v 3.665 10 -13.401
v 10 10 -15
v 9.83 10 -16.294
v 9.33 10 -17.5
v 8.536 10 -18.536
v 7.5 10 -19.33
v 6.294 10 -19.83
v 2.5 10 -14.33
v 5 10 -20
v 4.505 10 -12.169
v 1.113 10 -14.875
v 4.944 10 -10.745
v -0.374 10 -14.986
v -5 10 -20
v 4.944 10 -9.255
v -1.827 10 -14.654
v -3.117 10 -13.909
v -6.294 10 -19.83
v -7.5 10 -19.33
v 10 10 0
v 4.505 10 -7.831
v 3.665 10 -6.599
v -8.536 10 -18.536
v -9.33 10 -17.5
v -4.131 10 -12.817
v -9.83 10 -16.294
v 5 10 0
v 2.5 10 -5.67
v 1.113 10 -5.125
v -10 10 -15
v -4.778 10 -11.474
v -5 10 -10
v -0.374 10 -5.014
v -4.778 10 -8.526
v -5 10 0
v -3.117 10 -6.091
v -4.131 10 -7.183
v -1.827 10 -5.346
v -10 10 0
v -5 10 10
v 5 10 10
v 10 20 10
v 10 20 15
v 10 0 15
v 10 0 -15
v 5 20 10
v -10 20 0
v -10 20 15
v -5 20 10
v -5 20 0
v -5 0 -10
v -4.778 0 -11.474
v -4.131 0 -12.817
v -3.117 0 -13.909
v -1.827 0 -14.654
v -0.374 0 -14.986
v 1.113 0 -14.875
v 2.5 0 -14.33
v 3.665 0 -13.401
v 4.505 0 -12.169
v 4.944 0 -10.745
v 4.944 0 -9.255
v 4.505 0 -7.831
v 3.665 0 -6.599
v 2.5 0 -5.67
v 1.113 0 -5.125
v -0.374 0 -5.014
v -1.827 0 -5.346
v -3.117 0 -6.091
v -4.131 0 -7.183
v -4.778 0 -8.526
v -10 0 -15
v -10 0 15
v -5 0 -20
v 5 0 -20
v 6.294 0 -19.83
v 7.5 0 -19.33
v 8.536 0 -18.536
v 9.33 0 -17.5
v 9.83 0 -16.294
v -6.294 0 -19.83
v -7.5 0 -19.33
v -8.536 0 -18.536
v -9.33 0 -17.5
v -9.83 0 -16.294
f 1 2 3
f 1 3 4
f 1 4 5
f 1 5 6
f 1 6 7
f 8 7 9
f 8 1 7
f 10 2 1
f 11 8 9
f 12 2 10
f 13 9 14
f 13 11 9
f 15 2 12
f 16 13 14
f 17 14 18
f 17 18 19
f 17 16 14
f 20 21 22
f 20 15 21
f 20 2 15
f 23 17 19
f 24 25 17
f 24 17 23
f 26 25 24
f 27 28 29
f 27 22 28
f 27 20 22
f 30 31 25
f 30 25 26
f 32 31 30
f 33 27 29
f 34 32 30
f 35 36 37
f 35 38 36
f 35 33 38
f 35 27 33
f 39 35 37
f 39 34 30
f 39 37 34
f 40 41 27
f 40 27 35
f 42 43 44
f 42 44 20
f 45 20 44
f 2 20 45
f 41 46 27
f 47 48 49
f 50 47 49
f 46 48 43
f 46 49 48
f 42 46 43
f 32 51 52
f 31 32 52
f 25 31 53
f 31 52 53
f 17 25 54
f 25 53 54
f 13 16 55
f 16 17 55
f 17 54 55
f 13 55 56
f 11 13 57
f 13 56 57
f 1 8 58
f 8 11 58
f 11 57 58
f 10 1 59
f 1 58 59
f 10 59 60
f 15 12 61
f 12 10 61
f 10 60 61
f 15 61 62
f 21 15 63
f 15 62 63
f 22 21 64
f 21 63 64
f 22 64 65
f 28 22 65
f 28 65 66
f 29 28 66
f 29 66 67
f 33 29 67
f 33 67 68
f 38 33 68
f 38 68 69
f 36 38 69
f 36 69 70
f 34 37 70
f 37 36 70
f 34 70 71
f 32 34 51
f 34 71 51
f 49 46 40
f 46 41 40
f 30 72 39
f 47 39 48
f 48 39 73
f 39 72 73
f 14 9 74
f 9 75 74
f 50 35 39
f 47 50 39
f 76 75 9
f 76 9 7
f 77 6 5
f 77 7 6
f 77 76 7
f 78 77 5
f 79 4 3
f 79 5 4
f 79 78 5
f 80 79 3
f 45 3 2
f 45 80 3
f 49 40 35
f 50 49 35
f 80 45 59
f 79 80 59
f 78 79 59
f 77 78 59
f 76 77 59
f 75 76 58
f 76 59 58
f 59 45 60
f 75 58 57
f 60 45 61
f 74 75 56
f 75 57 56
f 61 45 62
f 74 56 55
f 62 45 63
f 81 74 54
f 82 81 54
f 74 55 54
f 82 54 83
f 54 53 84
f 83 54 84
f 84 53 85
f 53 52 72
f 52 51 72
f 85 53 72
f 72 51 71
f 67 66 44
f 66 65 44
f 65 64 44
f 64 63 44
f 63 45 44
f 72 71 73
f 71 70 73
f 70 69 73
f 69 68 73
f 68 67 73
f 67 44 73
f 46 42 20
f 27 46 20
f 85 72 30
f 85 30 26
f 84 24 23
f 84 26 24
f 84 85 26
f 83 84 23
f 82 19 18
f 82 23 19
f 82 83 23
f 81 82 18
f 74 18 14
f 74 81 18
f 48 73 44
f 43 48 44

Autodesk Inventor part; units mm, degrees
ref_plane "YZ Plane" through (0, 0, 0) normal (1, 0, 0) x (0, 1, 0)
ref_plane "XZ Plane" through (0, 0, 0) normal (0, 1, 0) x (-1, 0, 0)
ref_plane "XY Plane" through (0, 0, 0) normal (0, 0, 1) x (1, 0, 0)
sketch "草圖1" plane through (0, 0, 0) normal (0, 1, 0) x (-1, 0, 0)
  line L0 (10, 15) -> (-10, 15)
  line L1 (-10, 15) -> (-10, -15)
  line L2 (-5, -20) -> (5, -20)
  line L3 (10, -15) -> (10, 15)
  arc A0 (5, -20) -> (10, -15) centre (5, -15) ccw
  arc A1 (-10, -15) -> (-5, -20) centre (-5, -15) ccw
  circle A2 centre (0, -10) radius 5
  point P0 (0, 0)
  point P1 (10, -20)
  point P2 (0, -20)
  point P3 (10, 0)
  dimension "d0" = 35
  dimension "d1" = 20
  dimension "d2" = 5
  dimension "d3" = 10
  dimension "d4" = 10
extrude "擠出1" add sketch "草圖1" along normal blind 10
sketch "草圖2" plane through (0, 10, 0) normal (0, 1, 0) x (1, 0, 0)
  circle A0 centre (0, 10) radius 5 construction
  line L0 (-10, -15) -> (10, -15) construction
  line L1 (10, -15) -> (10, 15) construction
  arc A1 (10, 15) -> (5, 20) centre (5, 15) ccw construction
  line L2 (5, 20) -> (-5, 20) construction
  arc A2 (-5, 20) -> (-10, 15) centre (-5, 15) ccw construction
  line L3 (-10, 15) -> (-10, -15) construction
  line L4 (10, -15) -> (10, 15) projected
  line L5 (-10, -15) -> (10, -15)
  line L6 (10, -15) -> (10, -10)
  line L7 (10, -10) -> (-5, -10)
  line L8 (-10, -10.0359) -> (-10, -15)
  line L9 (-10, -15) -> (10, -15) projected
  line L10 (-10, -15) -> (-6.3427, -15)
  line L11 (-5, -10) -> (-5, 0)
  line L12 (-5, 0) -> (-10, 0)
  line L13 (-10, 0) -> (-10, -15)
  point P0 (0, 0)
  dimension "d7" = 5
  dimension "d8" = 5
  dimension "d9" = 15
extrude "擠出2" add sketch "草圖2" along normal blind 10
sketch "草圖3" plane through (10, 0, 15) normal (1, 0, 0) x (0, 0, -1)
  line L0 (15, 10) -> (5, 10) construction
  line L1 (15, 10) -> (15, 20) construction
  line L2 (5, 20) -> (15, 20) construction
  line L3 (5, 10) -> (5, 20) construction
  line L4 (5, 10) -> (5, 20) projected
  line L5 (30, 10) -> (15, 10) projected
  line L6 (5, 20) -> (15, 10)
  line L7 (5, 10) -> (30, 10) projected
  line L8 (15, 10) -> (5, 10)
  line L9 (5, 10) -> (5, 20)
  point P0 (15, 0)
extrude "擠出3" add sketch "草圖3" against normal blind 5
properties part number "2"
